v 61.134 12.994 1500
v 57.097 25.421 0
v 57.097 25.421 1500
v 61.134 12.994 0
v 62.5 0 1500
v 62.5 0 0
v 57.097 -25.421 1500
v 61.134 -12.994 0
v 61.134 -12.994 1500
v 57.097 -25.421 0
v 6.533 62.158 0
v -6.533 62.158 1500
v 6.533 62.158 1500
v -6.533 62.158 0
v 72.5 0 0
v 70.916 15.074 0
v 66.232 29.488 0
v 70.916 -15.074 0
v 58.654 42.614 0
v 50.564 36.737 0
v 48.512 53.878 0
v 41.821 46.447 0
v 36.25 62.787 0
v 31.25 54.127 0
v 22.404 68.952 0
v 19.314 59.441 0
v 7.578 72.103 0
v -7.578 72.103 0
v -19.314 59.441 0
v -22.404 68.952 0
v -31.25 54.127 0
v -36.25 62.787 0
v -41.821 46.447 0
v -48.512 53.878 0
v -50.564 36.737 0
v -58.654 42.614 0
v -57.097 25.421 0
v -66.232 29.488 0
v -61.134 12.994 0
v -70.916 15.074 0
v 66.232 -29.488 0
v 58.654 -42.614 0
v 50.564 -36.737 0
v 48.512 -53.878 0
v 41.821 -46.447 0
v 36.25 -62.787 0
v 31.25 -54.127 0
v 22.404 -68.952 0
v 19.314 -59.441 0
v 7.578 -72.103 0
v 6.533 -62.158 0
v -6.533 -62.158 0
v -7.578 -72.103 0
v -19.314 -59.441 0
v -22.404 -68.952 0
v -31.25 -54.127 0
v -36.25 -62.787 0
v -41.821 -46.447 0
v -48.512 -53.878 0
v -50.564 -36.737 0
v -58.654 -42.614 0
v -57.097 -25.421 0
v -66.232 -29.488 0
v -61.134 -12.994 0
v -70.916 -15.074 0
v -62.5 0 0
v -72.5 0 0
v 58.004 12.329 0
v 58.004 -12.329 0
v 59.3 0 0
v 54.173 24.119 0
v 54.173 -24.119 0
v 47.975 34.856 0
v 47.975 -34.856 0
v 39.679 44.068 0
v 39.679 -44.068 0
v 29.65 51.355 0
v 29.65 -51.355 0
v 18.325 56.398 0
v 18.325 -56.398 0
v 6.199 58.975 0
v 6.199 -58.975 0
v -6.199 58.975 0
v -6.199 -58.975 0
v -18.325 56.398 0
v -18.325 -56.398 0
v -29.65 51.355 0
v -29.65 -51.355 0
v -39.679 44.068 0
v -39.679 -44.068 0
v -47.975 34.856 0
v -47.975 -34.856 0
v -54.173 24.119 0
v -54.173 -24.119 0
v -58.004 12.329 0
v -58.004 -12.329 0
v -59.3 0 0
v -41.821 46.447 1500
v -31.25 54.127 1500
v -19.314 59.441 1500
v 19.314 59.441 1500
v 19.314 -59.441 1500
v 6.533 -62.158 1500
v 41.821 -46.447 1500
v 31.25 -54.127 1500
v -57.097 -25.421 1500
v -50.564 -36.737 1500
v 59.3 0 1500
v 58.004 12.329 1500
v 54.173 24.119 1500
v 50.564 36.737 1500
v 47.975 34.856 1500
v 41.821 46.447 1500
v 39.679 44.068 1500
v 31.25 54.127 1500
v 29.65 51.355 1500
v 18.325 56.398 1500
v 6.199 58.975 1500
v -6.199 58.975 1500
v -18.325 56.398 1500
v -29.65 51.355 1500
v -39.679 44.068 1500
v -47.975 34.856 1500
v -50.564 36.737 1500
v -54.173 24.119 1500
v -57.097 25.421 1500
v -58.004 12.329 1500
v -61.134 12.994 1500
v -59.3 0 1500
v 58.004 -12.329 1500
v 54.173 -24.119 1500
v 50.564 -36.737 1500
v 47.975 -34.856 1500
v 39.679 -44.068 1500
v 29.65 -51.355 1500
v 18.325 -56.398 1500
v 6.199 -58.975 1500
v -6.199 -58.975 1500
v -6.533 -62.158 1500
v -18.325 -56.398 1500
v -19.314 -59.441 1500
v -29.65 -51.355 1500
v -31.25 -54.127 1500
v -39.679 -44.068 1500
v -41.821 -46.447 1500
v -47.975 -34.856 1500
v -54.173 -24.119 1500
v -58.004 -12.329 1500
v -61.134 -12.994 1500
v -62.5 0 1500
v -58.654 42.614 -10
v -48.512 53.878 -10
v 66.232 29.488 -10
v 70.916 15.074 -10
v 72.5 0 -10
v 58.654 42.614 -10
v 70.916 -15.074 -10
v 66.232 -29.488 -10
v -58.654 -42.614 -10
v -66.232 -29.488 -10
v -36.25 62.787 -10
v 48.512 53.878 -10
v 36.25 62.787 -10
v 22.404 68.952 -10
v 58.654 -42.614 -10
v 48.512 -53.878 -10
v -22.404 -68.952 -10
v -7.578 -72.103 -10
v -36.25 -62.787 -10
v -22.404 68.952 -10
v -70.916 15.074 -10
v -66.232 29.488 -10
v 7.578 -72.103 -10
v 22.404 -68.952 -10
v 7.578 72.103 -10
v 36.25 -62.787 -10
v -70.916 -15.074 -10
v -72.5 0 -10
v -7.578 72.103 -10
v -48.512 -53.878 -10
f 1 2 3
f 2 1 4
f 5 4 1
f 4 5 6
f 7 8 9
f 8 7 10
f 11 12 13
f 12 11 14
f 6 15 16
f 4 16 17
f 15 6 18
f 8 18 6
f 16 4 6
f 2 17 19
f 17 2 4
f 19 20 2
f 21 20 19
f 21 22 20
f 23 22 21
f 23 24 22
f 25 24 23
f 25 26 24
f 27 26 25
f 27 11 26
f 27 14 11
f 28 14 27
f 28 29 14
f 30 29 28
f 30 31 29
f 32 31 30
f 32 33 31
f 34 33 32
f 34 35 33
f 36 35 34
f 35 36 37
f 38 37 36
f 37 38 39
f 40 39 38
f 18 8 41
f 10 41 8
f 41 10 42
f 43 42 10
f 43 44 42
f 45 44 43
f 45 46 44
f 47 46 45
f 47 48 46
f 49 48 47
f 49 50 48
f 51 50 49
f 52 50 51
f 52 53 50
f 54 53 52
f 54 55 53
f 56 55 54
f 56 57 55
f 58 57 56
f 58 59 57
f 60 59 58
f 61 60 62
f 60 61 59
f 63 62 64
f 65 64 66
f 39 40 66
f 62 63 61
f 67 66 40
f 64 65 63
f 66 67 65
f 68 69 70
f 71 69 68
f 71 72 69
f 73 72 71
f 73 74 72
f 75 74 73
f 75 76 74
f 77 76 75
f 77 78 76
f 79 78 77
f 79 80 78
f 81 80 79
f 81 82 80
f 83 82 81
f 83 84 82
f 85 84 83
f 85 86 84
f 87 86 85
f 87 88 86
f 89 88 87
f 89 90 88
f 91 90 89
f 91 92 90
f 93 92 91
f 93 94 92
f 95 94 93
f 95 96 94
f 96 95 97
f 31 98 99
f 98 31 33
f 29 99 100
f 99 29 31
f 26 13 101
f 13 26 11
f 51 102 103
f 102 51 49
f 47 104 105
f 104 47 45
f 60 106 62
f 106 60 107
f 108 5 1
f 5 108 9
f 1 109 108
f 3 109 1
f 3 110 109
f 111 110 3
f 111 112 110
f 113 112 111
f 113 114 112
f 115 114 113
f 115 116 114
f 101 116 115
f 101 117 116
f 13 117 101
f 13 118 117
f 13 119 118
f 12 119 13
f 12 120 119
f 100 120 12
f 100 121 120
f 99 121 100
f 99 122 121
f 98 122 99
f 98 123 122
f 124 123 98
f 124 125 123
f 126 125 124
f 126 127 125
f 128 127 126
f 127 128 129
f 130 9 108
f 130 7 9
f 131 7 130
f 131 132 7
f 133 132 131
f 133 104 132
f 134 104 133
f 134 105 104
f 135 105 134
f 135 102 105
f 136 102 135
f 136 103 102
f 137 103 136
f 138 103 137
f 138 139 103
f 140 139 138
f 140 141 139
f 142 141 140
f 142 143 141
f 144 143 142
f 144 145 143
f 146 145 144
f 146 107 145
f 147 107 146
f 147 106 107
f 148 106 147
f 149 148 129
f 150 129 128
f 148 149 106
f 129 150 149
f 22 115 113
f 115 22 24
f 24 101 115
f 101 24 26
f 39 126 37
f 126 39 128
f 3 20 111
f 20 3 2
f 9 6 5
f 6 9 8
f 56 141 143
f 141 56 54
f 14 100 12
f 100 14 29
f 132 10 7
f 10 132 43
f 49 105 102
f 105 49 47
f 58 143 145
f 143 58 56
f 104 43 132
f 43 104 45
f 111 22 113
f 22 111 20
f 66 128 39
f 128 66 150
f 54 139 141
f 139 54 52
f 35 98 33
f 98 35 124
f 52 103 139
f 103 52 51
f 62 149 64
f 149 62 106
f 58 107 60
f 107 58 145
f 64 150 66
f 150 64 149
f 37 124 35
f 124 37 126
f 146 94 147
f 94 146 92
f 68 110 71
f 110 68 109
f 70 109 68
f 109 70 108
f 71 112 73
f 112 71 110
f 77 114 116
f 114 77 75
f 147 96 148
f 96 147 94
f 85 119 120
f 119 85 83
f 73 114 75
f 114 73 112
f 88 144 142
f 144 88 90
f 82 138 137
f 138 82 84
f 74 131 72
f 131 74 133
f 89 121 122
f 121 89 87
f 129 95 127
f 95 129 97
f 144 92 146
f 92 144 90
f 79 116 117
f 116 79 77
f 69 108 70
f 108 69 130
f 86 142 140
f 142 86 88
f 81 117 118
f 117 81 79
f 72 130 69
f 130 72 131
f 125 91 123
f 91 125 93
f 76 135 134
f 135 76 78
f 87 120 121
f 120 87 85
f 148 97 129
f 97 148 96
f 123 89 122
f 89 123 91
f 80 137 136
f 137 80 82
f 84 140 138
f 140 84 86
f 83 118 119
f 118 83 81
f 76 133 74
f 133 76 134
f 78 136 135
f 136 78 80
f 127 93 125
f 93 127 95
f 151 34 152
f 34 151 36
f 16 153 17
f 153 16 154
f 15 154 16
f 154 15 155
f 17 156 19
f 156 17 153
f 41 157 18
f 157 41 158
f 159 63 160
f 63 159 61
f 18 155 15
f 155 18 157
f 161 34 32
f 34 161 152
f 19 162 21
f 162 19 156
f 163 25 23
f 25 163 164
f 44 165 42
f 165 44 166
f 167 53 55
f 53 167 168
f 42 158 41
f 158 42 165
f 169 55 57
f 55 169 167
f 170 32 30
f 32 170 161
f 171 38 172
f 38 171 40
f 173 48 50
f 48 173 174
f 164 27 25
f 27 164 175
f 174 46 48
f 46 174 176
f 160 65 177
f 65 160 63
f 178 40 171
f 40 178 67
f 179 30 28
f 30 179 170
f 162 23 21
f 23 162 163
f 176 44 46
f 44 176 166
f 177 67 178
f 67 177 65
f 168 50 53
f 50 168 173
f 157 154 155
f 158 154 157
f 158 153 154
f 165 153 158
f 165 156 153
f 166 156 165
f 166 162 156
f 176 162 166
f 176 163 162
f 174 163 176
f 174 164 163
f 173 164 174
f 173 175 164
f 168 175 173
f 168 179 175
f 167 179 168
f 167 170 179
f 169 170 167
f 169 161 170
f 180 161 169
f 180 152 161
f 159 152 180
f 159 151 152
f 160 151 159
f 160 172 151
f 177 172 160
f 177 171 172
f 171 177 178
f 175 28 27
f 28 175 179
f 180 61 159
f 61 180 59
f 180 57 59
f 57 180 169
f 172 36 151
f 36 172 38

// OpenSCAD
// Define HT 125 pipe dimensions
outer_diameter = 125; // Outer diameter in mm
wall_thickness = 3.2; // Wall thickness in mm for HT 125
length = 1500; // Length of the pipe in mm

// Function to create a hollow cylinder (pipe)
module ht_pipe_segment(outer_diameter, wall_thickness, length) {
    difference() {
        cylinder(d=outer_diameter, h=length, center=false);
        cylinder(d=outer_diameter - 2 * wall_thickness, h=length + 1, center=false);
    }
}

// Optional end fitting geometry
module end_fitting_geometry(outer_diameter, wall_thickness) {
    // Example end fitting: simple flange
    flange_thickness = 10; // Thickness of the flange
    flange_diameter = outer_diameter + 20; // Diameter of the flange

    translate([0, 0, -flange_thickness])
    cylinder(d=flange_diameter, h=flange_thickness, center=false);
}

// Main module to create the HT pipe with optional end fitting
module ht_pipe() {
    ht_pipe_segment(outer_diameter, wall_thickness, length);
    end_fitting_geometry(outer_diameter, wall_thickness);
}

// Render the HT pipe
ht_pipe();
